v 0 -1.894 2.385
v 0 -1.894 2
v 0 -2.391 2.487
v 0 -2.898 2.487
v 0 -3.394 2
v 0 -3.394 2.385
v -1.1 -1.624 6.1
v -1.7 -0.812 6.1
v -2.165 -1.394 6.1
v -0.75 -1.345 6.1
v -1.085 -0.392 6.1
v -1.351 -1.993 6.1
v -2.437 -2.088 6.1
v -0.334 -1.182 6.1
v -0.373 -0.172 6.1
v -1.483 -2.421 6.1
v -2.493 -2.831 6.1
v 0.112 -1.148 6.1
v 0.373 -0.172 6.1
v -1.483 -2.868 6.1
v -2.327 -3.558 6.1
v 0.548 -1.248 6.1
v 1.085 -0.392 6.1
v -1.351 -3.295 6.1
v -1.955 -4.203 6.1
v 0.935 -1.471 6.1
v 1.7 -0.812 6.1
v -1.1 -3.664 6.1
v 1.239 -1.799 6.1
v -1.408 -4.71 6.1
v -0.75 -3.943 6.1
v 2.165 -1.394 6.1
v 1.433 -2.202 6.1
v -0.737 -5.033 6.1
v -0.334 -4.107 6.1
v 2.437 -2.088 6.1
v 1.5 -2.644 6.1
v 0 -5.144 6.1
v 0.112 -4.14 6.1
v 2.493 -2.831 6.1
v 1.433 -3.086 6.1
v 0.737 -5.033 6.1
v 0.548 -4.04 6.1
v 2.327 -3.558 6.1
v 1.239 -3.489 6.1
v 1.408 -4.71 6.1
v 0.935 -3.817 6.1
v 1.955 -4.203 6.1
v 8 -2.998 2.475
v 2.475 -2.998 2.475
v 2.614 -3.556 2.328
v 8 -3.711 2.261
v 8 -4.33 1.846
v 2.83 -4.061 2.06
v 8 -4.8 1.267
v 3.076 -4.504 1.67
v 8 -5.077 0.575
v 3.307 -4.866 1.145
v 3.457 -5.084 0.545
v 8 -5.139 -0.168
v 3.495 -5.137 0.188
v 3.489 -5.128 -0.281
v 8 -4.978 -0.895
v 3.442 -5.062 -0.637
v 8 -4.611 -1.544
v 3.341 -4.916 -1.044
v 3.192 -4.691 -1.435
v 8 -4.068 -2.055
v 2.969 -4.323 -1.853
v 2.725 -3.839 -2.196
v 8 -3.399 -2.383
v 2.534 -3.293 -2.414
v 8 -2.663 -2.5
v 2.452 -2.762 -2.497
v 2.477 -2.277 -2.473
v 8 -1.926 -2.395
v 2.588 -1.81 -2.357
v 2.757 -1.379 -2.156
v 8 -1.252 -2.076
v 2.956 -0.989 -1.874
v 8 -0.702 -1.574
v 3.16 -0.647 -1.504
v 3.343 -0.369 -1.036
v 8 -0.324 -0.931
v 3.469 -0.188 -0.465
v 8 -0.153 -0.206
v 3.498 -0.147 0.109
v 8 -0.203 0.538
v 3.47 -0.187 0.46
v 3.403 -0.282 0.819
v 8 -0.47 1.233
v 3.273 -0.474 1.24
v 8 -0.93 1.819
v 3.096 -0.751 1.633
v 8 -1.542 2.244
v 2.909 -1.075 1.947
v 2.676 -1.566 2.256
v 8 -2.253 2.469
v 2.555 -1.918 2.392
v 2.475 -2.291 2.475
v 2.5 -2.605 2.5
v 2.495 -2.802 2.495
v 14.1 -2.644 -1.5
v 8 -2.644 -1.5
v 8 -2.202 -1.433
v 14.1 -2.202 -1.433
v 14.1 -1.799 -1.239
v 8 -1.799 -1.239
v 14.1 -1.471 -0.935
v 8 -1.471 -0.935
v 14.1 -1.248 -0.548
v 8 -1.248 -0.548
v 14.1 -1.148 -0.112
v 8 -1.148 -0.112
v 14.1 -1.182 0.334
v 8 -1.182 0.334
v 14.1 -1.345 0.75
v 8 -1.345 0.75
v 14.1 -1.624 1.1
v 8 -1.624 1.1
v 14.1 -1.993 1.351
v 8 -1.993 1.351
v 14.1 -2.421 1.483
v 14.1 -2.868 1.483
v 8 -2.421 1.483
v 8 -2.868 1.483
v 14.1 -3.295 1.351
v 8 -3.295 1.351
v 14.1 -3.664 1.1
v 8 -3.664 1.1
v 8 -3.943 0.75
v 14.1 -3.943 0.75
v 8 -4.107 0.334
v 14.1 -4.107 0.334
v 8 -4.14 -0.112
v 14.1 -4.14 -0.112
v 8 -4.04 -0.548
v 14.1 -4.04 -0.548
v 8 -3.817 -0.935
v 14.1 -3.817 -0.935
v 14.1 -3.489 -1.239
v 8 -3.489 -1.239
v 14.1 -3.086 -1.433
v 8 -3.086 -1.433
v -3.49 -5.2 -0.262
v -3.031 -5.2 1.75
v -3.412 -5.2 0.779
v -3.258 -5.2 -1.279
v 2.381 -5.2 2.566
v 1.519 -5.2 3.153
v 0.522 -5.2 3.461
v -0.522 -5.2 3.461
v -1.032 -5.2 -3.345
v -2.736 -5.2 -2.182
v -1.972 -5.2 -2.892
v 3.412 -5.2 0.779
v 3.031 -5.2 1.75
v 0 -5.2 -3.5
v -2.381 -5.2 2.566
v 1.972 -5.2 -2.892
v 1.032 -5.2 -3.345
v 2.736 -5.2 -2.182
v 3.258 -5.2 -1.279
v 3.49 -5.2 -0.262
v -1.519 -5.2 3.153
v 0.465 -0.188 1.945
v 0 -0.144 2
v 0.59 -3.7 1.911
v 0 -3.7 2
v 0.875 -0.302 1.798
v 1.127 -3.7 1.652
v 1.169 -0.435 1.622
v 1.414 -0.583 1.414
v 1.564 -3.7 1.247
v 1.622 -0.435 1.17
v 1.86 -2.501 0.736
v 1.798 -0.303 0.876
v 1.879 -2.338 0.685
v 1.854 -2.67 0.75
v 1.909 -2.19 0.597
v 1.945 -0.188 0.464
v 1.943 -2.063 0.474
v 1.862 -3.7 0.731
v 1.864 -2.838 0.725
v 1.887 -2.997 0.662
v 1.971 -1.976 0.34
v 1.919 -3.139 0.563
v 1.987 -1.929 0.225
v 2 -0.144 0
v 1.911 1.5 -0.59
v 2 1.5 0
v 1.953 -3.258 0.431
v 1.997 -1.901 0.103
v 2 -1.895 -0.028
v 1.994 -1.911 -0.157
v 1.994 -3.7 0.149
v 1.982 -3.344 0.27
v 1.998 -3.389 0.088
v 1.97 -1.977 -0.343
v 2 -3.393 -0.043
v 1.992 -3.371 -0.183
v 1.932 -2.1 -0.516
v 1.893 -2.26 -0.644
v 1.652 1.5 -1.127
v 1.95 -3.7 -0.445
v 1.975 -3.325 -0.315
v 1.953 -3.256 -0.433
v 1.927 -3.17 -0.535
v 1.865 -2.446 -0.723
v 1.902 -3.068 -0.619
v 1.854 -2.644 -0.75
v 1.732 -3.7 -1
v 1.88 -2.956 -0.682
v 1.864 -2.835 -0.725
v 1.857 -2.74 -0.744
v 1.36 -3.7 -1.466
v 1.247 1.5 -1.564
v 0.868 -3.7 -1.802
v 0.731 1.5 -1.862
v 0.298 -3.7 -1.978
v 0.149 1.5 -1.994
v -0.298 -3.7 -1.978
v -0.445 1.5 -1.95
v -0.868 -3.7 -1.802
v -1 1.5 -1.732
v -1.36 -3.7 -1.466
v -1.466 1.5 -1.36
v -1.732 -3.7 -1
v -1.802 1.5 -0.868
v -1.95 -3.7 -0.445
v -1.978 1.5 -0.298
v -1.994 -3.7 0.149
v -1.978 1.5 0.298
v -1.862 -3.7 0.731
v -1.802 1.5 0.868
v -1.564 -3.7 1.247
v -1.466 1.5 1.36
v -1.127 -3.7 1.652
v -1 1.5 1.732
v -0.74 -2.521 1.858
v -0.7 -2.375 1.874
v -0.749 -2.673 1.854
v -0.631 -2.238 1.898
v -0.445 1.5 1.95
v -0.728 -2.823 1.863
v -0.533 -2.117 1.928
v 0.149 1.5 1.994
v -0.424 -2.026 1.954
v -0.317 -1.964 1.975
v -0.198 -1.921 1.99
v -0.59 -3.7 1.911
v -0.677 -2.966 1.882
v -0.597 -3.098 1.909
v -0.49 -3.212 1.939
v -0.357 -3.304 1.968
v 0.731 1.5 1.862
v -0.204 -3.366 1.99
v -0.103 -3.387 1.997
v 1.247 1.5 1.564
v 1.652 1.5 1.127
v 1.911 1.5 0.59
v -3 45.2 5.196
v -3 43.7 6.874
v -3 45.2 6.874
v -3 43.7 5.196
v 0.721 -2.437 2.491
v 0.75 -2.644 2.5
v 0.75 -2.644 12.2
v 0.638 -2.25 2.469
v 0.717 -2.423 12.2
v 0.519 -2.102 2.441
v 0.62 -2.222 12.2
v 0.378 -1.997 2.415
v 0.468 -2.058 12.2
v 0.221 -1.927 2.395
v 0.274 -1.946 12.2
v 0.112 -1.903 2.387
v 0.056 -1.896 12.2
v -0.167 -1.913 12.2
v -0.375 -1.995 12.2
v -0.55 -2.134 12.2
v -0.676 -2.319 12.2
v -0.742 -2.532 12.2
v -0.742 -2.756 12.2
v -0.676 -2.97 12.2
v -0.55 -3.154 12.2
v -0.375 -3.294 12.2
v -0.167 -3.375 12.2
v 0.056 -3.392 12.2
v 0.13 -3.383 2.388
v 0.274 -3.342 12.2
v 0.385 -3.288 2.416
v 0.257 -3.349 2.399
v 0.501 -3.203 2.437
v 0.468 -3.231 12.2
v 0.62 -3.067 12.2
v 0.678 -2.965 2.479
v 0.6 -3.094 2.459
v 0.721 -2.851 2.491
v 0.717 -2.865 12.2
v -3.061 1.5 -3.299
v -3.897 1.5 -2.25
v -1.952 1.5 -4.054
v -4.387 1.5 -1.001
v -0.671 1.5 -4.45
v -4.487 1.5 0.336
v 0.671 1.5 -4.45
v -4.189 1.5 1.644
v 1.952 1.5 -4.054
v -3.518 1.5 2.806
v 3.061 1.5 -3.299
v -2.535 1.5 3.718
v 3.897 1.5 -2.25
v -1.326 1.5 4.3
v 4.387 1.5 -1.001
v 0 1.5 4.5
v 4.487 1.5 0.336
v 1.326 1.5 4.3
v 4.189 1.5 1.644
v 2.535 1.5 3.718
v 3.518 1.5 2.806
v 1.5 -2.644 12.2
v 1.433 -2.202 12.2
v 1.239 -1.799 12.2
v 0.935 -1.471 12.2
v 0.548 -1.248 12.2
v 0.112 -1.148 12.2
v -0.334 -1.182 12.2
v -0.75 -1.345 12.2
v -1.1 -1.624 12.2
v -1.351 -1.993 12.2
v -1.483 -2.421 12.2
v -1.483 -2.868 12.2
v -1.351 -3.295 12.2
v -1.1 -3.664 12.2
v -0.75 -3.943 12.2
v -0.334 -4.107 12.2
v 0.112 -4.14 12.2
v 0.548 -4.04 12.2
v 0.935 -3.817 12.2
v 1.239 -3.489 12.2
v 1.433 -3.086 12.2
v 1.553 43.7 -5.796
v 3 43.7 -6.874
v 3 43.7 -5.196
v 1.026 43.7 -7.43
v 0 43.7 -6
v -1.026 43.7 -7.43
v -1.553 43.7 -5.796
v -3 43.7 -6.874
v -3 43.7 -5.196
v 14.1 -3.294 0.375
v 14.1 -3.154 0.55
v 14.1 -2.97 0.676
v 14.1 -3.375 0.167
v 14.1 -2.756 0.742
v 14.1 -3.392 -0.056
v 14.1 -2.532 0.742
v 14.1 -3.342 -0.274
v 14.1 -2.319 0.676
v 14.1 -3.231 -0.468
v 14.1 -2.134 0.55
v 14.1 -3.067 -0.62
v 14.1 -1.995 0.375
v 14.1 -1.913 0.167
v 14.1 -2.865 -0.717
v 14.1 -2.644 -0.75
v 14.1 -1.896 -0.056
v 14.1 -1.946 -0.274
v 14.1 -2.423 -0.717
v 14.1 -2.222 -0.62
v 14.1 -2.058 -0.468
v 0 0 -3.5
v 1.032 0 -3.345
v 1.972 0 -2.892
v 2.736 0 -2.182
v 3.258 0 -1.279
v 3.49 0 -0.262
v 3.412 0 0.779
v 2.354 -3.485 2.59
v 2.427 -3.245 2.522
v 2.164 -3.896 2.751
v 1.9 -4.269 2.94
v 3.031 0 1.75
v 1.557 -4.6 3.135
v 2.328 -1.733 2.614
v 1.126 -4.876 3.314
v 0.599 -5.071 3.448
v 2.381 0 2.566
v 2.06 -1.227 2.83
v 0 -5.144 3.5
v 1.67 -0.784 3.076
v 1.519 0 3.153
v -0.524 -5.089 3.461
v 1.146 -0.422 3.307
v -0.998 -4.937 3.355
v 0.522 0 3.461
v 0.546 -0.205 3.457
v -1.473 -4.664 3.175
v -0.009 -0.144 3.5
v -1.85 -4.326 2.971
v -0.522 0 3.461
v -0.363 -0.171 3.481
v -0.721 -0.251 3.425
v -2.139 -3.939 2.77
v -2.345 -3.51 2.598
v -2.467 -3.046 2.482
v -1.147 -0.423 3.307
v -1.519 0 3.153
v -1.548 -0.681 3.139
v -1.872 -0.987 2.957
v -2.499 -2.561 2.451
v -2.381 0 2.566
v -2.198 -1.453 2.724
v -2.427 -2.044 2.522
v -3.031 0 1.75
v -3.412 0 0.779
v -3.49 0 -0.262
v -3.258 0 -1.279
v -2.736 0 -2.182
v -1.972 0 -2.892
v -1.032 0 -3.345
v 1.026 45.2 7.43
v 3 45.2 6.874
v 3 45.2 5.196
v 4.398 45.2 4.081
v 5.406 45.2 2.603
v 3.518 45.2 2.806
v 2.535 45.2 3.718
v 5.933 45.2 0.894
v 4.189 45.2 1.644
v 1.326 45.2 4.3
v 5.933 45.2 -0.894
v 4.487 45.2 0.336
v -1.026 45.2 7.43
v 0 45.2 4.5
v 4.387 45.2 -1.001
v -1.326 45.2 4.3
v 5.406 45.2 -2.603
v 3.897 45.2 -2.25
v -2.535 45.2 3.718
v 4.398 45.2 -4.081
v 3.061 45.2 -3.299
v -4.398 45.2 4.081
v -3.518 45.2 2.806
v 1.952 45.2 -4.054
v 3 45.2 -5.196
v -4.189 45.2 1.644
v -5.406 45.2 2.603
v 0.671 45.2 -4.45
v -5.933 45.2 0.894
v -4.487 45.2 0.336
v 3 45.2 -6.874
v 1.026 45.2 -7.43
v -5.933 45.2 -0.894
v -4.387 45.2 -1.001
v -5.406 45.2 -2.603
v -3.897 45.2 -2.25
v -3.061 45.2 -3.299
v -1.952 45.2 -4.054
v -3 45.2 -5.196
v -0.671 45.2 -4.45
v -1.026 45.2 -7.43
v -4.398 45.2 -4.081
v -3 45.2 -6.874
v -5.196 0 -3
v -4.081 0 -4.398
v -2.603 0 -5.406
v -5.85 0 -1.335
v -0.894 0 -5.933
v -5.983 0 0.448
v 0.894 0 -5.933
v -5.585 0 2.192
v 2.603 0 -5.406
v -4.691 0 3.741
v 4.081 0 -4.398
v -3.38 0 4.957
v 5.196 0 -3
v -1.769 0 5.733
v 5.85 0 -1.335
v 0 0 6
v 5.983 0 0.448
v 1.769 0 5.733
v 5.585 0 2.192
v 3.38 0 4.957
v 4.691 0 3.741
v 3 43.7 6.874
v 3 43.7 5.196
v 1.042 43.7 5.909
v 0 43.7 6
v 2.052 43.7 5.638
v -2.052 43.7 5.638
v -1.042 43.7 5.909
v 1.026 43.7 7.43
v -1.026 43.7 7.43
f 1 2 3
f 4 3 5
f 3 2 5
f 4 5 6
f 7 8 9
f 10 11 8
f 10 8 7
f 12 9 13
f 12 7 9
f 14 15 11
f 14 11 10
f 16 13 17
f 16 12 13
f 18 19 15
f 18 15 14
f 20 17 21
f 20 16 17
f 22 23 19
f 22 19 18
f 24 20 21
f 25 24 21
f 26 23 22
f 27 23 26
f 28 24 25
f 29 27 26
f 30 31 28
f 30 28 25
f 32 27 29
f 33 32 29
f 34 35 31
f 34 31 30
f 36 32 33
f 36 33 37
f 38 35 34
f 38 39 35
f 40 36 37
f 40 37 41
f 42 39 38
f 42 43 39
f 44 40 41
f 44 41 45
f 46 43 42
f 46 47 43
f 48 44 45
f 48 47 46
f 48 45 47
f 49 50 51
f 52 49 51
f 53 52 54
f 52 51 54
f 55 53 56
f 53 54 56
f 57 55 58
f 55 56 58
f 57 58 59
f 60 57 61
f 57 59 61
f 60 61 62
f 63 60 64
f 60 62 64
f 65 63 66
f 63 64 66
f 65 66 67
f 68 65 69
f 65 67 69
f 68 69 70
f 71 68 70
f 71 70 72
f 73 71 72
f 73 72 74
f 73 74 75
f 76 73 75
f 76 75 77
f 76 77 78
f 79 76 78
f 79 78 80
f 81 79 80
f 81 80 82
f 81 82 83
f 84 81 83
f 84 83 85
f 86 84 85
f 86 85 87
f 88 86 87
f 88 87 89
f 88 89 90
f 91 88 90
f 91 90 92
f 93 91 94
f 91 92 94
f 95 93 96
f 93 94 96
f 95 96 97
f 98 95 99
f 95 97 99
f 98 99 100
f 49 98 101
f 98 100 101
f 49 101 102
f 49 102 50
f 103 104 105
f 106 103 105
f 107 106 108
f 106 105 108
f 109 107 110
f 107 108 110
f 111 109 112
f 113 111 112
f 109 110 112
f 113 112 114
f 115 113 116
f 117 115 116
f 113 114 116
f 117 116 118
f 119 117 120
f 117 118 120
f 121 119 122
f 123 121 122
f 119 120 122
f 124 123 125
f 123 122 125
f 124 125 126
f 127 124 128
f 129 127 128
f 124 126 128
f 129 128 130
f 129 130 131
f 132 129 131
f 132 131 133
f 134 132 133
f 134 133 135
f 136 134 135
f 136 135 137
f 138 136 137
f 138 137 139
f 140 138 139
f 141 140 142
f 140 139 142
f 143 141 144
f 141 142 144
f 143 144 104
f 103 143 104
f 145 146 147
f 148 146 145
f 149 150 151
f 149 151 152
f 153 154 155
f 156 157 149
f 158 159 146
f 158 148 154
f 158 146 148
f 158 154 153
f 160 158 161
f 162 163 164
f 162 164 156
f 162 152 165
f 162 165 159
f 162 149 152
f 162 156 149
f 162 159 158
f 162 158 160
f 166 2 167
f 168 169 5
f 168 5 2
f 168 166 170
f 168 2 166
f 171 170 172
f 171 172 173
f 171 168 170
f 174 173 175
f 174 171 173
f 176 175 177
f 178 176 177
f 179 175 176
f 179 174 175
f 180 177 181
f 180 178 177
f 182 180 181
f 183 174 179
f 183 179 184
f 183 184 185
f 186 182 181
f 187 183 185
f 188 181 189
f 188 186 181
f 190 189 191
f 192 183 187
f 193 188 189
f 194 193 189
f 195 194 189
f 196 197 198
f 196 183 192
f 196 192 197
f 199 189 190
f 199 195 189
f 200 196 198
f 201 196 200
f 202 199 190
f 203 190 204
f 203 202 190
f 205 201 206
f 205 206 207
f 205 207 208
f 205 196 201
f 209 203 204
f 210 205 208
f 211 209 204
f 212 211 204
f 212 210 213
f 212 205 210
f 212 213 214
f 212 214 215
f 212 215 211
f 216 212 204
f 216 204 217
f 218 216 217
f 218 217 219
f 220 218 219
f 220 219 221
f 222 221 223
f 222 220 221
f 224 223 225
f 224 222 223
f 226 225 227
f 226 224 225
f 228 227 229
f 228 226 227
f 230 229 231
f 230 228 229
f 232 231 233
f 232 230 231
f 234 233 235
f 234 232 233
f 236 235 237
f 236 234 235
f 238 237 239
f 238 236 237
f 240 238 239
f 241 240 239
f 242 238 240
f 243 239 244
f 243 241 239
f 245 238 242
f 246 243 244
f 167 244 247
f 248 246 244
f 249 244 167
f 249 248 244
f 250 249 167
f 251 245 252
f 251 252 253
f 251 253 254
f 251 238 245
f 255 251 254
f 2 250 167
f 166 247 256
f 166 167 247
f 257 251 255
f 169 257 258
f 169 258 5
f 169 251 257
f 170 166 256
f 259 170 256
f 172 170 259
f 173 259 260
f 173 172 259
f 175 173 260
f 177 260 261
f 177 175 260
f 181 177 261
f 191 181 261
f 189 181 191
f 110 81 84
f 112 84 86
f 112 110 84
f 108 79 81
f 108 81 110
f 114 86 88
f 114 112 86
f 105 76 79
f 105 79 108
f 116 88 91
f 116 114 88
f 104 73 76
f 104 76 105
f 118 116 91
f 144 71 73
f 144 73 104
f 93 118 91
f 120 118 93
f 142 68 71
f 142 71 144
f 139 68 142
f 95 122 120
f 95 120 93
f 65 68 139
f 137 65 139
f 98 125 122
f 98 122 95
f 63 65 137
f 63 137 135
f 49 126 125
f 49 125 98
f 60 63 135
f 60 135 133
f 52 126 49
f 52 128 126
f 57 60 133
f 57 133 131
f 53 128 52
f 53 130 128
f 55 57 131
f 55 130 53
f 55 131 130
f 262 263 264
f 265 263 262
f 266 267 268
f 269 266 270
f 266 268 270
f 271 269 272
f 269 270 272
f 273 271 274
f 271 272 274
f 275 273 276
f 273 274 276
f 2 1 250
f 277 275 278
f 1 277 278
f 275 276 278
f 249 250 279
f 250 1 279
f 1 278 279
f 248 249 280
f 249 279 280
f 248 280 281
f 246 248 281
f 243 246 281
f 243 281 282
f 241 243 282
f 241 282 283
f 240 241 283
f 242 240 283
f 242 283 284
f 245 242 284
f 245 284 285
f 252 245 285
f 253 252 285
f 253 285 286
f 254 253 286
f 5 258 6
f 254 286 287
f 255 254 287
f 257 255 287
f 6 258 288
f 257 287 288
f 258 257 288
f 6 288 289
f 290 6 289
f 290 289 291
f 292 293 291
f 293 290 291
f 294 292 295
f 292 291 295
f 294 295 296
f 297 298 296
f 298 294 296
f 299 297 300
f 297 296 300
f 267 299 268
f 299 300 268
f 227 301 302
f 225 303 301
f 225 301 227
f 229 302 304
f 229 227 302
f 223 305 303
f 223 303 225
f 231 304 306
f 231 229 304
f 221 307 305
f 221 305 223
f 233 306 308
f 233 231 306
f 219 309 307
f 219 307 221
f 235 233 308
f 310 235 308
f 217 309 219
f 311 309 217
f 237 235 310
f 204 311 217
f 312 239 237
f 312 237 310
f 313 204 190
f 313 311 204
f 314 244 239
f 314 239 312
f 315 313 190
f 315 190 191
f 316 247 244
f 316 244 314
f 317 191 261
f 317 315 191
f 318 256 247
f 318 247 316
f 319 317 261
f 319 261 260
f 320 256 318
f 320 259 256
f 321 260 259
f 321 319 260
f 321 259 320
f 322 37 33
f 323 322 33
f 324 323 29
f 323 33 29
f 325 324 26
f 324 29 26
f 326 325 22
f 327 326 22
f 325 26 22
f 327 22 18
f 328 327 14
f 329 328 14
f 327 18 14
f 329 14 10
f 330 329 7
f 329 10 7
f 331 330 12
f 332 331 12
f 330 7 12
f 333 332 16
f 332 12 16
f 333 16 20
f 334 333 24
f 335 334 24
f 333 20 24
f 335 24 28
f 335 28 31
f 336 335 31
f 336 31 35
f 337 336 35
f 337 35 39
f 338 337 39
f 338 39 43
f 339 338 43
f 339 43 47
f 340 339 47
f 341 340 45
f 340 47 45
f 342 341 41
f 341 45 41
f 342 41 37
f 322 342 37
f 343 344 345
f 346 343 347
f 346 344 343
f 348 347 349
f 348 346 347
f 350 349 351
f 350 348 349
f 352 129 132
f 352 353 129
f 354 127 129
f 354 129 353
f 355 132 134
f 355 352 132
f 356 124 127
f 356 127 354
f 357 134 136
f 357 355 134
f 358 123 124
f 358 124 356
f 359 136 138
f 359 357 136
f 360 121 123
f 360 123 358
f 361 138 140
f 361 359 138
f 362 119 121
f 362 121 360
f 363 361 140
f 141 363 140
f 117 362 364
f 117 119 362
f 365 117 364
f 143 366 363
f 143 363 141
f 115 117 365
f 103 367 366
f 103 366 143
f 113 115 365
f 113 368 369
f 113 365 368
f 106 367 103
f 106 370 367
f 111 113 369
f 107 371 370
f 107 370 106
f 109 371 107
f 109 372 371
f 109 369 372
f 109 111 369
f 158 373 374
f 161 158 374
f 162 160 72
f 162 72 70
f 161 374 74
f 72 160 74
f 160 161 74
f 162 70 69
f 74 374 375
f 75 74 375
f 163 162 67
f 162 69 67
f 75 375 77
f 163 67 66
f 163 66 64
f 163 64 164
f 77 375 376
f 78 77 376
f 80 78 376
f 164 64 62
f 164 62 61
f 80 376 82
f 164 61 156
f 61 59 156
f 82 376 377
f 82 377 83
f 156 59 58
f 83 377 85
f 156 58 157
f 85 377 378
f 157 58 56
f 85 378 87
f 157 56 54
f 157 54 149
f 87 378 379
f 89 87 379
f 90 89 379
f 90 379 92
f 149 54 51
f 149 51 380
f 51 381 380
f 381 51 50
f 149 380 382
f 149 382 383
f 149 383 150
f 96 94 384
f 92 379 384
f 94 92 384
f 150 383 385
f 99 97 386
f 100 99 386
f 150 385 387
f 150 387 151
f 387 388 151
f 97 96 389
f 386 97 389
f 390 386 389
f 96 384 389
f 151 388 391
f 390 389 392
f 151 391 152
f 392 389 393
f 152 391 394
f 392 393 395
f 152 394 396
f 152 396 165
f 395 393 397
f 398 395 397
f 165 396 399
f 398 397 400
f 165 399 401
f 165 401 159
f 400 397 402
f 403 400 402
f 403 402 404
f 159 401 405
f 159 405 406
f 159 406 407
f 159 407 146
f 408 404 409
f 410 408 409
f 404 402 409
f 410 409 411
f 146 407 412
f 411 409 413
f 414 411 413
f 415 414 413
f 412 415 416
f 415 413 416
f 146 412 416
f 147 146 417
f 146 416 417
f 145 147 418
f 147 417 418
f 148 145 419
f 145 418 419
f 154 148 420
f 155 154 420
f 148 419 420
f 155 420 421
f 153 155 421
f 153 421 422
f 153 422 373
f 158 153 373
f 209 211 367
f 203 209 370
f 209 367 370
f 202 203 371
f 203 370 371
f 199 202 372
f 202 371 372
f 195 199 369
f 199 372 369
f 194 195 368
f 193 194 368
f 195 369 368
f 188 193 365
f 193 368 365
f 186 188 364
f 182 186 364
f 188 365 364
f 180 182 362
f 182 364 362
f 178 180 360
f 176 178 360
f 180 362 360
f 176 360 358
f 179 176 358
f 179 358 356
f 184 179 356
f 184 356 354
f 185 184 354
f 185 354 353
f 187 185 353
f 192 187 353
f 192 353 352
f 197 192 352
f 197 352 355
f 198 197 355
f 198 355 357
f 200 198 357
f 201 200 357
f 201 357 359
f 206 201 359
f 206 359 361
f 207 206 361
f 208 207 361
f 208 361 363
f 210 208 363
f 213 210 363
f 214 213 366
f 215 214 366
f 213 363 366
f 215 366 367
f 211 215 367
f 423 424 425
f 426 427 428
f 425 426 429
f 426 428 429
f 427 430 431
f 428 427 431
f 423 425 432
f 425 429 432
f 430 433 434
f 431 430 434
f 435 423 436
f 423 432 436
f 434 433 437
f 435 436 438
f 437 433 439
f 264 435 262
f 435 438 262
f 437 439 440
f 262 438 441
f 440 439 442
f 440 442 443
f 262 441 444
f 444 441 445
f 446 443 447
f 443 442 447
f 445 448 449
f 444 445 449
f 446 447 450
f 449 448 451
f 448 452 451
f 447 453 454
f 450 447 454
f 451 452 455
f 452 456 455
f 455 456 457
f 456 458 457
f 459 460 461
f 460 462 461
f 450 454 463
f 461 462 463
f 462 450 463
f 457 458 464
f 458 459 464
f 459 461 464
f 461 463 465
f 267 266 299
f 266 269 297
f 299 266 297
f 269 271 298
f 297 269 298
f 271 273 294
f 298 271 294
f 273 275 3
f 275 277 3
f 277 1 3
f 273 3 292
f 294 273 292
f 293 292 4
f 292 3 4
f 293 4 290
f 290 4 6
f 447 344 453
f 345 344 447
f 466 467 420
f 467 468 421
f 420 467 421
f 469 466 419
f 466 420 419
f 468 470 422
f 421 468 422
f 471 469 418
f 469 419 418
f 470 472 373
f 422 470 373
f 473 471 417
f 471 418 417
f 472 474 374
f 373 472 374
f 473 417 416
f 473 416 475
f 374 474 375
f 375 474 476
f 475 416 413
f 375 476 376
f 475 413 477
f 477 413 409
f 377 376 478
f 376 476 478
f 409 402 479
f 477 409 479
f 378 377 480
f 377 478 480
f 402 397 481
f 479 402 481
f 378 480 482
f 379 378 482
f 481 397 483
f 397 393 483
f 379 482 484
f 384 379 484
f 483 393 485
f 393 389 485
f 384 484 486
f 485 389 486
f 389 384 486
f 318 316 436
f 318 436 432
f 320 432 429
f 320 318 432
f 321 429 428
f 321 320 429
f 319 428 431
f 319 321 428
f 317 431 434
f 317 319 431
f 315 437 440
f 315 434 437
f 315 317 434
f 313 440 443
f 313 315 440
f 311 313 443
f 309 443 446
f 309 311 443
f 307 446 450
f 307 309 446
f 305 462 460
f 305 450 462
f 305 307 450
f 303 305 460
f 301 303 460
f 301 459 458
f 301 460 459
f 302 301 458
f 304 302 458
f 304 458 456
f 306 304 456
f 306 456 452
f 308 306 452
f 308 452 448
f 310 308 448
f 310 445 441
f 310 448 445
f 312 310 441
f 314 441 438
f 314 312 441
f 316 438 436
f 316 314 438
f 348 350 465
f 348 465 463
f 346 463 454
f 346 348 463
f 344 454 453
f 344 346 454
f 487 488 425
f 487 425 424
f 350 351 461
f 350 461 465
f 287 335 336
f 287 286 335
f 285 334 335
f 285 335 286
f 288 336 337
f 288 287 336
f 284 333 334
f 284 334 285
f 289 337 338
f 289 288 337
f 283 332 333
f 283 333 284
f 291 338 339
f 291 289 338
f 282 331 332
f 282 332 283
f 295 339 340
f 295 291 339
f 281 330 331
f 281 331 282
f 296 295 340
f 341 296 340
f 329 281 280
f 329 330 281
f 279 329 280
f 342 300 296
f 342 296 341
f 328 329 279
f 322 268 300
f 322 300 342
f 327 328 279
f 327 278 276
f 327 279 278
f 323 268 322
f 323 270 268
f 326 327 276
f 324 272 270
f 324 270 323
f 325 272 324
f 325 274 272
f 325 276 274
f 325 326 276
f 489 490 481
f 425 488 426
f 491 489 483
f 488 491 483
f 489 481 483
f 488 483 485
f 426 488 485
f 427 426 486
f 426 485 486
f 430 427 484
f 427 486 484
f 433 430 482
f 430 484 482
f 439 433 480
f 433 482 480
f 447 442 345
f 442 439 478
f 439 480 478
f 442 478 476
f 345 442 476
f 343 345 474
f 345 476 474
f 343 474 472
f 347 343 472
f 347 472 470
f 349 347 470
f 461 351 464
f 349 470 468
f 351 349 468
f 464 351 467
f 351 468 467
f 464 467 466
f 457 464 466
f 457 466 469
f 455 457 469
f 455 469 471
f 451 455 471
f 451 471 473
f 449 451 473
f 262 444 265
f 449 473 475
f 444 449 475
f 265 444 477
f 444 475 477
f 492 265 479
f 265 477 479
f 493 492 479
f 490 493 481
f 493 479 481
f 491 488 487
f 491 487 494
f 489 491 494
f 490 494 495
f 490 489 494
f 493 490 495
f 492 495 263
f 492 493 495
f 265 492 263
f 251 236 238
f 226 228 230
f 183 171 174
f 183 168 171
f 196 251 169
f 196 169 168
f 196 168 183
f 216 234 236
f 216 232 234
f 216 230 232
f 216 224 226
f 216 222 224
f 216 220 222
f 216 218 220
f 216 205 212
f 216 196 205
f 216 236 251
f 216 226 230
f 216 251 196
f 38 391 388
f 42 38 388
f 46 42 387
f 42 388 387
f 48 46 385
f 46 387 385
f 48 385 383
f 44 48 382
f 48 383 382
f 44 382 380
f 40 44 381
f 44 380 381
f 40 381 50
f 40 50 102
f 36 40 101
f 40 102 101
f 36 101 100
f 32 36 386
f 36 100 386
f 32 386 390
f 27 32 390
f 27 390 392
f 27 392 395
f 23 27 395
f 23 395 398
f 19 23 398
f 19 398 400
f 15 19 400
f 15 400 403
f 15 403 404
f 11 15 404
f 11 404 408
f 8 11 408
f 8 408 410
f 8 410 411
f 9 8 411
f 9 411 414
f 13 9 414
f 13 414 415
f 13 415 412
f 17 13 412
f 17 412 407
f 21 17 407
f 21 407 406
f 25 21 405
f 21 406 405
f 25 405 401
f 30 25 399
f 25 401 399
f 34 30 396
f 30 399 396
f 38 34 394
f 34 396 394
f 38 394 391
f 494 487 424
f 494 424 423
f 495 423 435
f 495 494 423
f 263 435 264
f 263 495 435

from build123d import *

# Parameters (mm, degrees)
SKETCH1_R           = 6
BOSS_EXTRUDE1_DEPTH = 45.2
SHELL1_T            = -1.5
SKETCH2_R           = 3.5
BOSS_EXTRUDE2_DEPTH = 5.2
SHELL2_START        = -3.7
SHELL2_OUTLINE_R    = 2
SHELL2_DEPTH        = 5.2
SKETCH3_R           = 2.5
BOSS_EXTRUDE3_DEPTH = 6.1
SKETCH4_R           = 1.5
BOSS_EXTRUDE4_DEPTH = 6.1
SKETCH5_R           = 0.75
CUT_EXTRUDE1_DEPTH  = 12.1
SKETCH6_R           = 2
CUT_EXTRUDE2_DEPTH  = 12.1
SKETCH7_R           = 2.5
BOSS_EXTRUDE5_DEPTH = 8
SKETCH8_R           = 1.5
BOSS_EXTRUDE6_DEPTH = 6.1
SKETCH9_R           = 0.75
CUT_EXTRUDE3_DEPTH  = 14.1
SKETCH10_R          = 2
CUT_EXTRUDE4_DEPTH  = 14.1
BOSS_EXTRUDE7_START = -1.5
BOSS_EXTRUDE7_DEPTH = 1.5


# Read off the part's stored shape, not the designer's step: Shell2
with BuildPart() as part:
    # Sketch1 → Boss-Extrude1 (new body)
    with BuildSketch(Plane(origin=(0, 0, 0), x_dir=(1, 0, 0), z_dir=(0, 1, 0))):
        with Locations(Location((0, 0, 0), (0, 0, 270))):
            Circle(SKETCH1_R)
    extrude(amount=BOSS_EXTRUDE1_DEPTH)

    # Shell1
    shell1_openings = [part.faces().sort_by_distance(p)[0] for p in [
        (0, 45.2, 0),
    ]]
    offset(amount=SHELL1_T, openings=shell1_openings, kind=Kind.INTERSECTION)

    # Sketch2 → Boss-Extrude2 (add)
    with BuildSketch(Plane.XZ):
        with Locations(Location((0, 0, 0), (0, 0, 270))):
            Circle(SKETCH2_R)
    extrude(amount=BOSS_EXTRUDE2_DEPTH)

    # Shell2 outline → Shell2 (cut)
    with BuildSketch(Plane(origin=(0, 0, 0), x_dir=(1, 0, 0), z_dir=(0, 1, 0)).offset(SHELL2_START)):
        Circle(SHELL2_OUTLINE_R)
    extrude(amount=SHELL2_DEPTH, mode=Mode.SUBTRACT)

    # Sketch3 → Boss-Extrude3 (add)
    with BuildSketch(Plane.XY):
        with Locations(Location((0, -2.644163182, 0), (0, 0, 270))):
            Circle(SKETCH3_R)
    extrude(amount=BOSS_EXTRUDE3_DEPTH)

    # Sketch4 → Boss-Extrude4 (add)
    with BuildSketch(Plane.XY.offset(6.1)):
        with Locations((0, -2.644163182)):
            Circle(SKETCH4_R)
    extrude(amount=BOSS_EXTRUDE4_DEPTH)

    # Sketch5 → Cut-Extrude1 (cut)
    with BuildSketch(Plane.XY.offset(12.2)):
        with Locations((0, -2.644163182)):
            Circle(SKETCH5_R)
    extrude(amount=-CUT_EXTRUDE1_DEPTH, mode=Mode.SUBTRACT)

    # Sketch6 → Cut-Extrude2 (cut)
    with BuildSketch(Plane(origin=(0, -3.7, 0), x_dir=(1, 0, 0), z_dir=(0, 1, 0))):
        with Locations(Location((0, 0, 0), (0, 0, 270))):
            Circle(SKETCH6_R)
    extrude(amount=CUT_EXTRUDE2_DEPTH, mode=Mode.SUBTRACT)

    # Sketch7 → Boss-Extrude5 (add)
    with BuildSketch(Plane(origin=(0, 0, 0), x_dir=(0, 0, -1), z_dir=(1, 0, 0))):
        with Locations(Location((0, -2.644163182, 0), (0, 0, 188.130102354))):
            Circle(SKETCH7_R)
    extrude(amount=BOSS_EXTRUDE5_DEPTH)

    # Sketch8 → Boss-Extrude6 (add)
    with BuildSketch(Plane(origin=(8, 0, 0), x_dir=(0, 0, -1), z_dir=(1, 0, 0))):
        with Locations((0, -2.644163182)):
            Circle(SKETCH8_R)
    extrude(amount=BOSS_EXTRUDE6_DEPTH)

    # Sketch9 → Cut-Extrude3 (cut)
    with BuildSketch(Plane(origin=(14.1, 0, 0), x_dir=(0, 0, -1), z_dir=(1, 0, 0))):
        with Locations((0, -2.644163182)):
            Circle(SKETCH9_R)
    extrude(amount=-CUT_EXTRUDE3_DEPTH, mode=Mode.SUBTRACT)

    # Sketch10 → Cut-Extrude4 (cut)
    with BuildSketch(Plane(origin=(0, -3.7, 0), x_dir=(1, 0, 0), z_dir=(0, 1, 0))):
        with Locations(Location((0, 0, 0), (0, 0, 270))):
            Circle(SKETCH10_R)
    extrude(amount=CUT_EXTRUDE4_DEPTH, mode=Mode.SUBTRACT)

    # Sketch11 → Boss-Extrude7 (add)
    with BuildSketch(Plane(origin=(0, 45.2, 0), x_dir=(1, 0, 0), z_dir=(0, 1, 0)).offset(BOSS_EXTRUDE7_START)):
        with BuildLine():
            Line((3, -5.196152423), (3, -6.873863542))
            ThreePointArc((3, -6.873863542), (0, -7.5), (-3, -6.873863542))
            Line((-3, -6.873863542), (-3, -5.196152423))
            ThreePointArc((-3, -5.196152423), (0, -6), (3, -5.196152423))
        make_face()
        with BuildLine():
            Line((-3, 5.196152423), (-3, 6.873863542))
            ThreePointArc((-3, 6.873863542), (0, 7.5), (3, 6.873863542))
            Line((3, 6.873863542), (3, 5.196152423))
            ThreePointArc((3, 5.196152423), (0, 6), (-3, 5.196152423))
        make_face()
    extrude(amount=BOSS_EXTRUDE7_DEPTH)


solid = part.part
